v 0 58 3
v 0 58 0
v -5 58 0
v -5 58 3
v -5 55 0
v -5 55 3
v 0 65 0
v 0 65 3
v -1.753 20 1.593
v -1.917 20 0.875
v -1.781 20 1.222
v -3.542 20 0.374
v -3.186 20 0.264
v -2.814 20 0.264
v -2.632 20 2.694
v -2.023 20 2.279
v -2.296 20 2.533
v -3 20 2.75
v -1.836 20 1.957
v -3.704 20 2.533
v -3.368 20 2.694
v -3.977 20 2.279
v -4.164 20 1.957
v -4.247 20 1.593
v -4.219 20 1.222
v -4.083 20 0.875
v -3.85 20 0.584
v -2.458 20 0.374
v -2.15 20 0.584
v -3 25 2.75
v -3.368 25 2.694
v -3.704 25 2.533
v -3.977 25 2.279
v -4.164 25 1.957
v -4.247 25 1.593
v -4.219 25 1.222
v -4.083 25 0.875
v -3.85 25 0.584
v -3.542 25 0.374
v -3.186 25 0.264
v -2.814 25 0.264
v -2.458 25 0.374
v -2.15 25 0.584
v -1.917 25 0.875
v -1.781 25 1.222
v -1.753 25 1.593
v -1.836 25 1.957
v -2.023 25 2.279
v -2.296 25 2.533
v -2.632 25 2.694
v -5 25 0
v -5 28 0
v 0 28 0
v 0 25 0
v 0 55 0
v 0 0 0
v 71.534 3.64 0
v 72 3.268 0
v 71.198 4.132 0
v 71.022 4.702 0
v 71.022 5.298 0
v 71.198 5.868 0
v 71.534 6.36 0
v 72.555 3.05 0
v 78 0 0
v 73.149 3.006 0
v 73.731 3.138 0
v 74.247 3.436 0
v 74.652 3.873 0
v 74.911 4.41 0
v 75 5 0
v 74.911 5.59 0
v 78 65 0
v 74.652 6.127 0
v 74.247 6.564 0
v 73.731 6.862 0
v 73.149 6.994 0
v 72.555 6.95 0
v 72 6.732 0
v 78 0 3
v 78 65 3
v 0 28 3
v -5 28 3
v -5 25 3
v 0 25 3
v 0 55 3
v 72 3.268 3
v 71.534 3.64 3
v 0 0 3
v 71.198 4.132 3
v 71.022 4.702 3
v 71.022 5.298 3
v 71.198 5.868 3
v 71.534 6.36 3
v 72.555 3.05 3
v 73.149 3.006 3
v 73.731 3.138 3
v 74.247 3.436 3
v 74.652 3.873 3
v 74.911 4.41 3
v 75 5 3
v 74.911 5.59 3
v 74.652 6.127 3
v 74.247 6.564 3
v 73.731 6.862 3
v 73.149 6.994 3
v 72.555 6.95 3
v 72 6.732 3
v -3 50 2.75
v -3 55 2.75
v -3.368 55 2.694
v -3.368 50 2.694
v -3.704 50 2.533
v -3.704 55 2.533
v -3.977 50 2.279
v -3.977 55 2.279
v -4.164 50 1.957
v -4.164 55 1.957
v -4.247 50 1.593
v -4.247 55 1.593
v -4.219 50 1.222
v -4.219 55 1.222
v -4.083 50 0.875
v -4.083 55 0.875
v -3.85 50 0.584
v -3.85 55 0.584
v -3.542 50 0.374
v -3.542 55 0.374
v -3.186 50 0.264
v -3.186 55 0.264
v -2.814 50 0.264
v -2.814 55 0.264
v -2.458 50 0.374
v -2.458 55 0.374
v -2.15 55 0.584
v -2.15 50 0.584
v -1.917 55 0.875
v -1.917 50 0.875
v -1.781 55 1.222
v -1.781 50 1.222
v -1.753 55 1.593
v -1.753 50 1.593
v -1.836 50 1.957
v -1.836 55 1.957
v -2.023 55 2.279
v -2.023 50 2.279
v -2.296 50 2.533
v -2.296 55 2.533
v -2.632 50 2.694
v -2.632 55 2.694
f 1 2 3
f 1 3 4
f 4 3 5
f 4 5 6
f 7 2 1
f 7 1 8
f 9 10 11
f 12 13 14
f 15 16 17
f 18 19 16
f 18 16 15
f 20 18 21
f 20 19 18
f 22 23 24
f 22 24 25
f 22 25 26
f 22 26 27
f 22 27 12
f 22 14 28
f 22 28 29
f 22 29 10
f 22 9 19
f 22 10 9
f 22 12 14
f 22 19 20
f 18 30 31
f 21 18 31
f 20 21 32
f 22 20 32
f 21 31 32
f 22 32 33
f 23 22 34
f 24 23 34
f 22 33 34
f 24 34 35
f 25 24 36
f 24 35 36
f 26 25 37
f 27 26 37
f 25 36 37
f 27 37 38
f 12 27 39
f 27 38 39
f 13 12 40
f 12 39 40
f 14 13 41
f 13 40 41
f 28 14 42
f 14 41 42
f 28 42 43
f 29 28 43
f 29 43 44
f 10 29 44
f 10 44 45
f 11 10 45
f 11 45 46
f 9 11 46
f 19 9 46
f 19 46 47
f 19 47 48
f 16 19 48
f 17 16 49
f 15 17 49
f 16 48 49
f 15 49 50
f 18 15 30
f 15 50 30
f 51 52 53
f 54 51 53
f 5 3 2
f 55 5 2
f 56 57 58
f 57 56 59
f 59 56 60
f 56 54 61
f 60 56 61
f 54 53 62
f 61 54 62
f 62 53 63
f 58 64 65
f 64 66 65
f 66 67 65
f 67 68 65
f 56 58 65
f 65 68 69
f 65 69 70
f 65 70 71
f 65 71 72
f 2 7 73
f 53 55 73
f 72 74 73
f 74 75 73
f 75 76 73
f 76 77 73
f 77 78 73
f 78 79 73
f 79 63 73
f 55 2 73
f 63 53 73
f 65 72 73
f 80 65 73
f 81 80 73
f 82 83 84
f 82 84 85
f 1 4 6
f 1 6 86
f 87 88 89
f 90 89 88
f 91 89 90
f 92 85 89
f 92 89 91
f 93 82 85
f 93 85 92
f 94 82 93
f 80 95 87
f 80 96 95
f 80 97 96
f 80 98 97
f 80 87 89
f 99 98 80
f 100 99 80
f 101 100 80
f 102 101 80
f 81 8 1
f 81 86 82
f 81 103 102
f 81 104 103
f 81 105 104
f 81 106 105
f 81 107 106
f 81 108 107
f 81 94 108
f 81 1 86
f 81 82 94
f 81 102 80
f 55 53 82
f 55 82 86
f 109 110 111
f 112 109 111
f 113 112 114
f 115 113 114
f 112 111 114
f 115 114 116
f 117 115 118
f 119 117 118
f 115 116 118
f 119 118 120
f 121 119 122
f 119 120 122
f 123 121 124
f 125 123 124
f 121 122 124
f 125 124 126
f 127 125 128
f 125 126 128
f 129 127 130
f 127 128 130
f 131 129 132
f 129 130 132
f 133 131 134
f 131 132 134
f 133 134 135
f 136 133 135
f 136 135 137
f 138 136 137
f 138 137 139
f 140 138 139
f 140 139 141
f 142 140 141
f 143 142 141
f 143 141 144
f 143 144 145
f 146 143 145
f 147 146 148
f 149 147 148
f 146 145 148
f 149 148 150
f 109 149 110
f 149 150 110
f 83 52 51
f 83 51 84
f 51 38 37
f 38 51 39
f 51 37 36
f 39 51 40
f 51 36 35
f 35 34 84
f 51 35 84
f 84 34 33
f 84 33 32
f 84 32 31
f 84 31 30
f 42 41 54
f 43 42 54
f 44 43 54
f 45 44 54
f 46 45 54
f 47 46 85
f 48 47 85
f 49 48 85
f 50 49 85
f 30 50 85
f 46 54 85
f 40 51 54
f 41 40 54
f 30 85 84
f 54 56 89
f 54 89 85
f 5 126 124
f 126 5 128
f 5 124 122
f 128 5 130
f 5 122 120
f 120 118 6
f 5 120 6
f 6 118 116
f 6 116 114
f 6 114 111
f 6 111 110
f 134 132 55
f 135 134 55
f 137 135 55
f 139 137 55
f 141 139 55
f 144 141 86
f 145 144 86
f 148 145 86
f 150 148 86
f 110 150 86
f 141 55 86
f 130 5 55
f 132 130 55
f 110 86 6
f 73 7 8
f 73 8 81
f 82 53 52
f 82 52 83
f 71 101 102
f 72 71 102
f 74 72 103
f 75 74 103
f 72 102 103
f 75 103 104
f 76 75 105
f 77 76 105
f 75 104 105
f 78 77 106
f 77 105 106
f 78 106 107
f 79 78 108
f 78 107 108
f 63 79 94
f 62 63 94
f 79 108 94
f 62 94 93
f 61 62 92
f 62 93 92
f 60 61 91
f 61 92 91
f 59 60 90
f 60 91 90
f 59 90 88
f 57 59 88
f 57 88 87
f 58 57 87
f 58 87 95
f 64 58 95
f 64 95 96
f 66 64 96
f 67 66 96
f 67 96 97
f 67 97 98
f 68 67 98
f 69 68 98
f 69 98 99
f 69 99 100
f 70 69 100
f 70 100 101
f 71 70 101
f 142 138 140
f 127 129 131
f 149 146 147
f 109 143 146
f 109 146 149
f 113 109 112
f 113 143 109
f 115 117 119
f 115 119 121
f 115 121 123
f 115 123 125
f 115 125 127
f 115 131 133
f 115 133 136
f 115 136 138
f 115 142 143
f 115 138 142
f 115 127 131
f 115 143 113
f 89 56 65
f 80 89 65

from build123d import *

# Parameters (mm, degrees)
IZIM1_W                     = 78
IZIM1_H                     = 65
Y_KSEKLIK_EKSTR_ZYON1_DEPTH = 3
IZIM2_W                     = 3
IZIM2_H                     = 3
Y_KSEKLIK_EKSTR_ZYON2_DEPTH = 5
IZIM4_R                     = 1.25
Y_KSEKLIK_EKSTR_ZYON3_DEPTH = 5
IZIM5_R                     = 1.25
Y_KSEKLIK_EKSTR_ZYON4_DEPTH = 5
IZIM6_R                     = 2
KES_EKSTR_ZYON2_DEPTH       = 10


with BuildPart() as part:
    # Çizim1 → Yükseklik-Ekstrüzyon1 (new body)
    with BuildSketch(Plane.XY):
        with Locations((39, 32.5)):
            Rectangle(IZIM1_W, IZIM1_H)
    extrude(amount=Y_KSEKLIK_EKSTR_ZYON1_DEPTH)

    # Çizim2 → Yükseklik-Ekstrüzyon2 (add)
    with BuildSketch(Plane.ZY):
        with Locations((1.5, 56.5)):
            Rectangle(IZIM2_W, IZIM2_H)
        with Locations((1.5, 26.5)):
            Rectangle(IZIM2_W, IZIM2_H)
    extrude(amount=Y_KSEKLIK_EKSTR_ZYON2_DEPTH)

    # Çizim4 → Yükseklik-Ekstrüzyon3 (add)
    with BuildSketch(Plane.XZ.offset(-55)):
        with Locations(Location((-3, 1.5, 0), (0, 0, 90))):
            Circle(IZIM4_R)
    extrude(amount=Y_KSEKLIK_EKSTR_ZYON3_DEPTH)

    # Çizim5 → Yükseklik-Ekstrüzyon4 (add)
    with BuildSketch(Plane.XZ.offset(-25)):
        with Locations(Location((-3, 1.5, 0), (0, 0, 90))):
            Circle(IZIM5_R)
    extrude(amount=Y_KSEKLIK_EKSTR_ZYON4_DEPTH)

    # Çizim6 → Kes-Ekstrüzyon2 (cut)
    with BuildSketch(Plane.XY.offset(3)):
        with Locations((73, 5)):
            Circle(IZIM6_R)
    extrude(amount=-KES_EKSTR_ZYON2_DEPTH, mode=Mode.SUBTRACT)


solid = part.part
